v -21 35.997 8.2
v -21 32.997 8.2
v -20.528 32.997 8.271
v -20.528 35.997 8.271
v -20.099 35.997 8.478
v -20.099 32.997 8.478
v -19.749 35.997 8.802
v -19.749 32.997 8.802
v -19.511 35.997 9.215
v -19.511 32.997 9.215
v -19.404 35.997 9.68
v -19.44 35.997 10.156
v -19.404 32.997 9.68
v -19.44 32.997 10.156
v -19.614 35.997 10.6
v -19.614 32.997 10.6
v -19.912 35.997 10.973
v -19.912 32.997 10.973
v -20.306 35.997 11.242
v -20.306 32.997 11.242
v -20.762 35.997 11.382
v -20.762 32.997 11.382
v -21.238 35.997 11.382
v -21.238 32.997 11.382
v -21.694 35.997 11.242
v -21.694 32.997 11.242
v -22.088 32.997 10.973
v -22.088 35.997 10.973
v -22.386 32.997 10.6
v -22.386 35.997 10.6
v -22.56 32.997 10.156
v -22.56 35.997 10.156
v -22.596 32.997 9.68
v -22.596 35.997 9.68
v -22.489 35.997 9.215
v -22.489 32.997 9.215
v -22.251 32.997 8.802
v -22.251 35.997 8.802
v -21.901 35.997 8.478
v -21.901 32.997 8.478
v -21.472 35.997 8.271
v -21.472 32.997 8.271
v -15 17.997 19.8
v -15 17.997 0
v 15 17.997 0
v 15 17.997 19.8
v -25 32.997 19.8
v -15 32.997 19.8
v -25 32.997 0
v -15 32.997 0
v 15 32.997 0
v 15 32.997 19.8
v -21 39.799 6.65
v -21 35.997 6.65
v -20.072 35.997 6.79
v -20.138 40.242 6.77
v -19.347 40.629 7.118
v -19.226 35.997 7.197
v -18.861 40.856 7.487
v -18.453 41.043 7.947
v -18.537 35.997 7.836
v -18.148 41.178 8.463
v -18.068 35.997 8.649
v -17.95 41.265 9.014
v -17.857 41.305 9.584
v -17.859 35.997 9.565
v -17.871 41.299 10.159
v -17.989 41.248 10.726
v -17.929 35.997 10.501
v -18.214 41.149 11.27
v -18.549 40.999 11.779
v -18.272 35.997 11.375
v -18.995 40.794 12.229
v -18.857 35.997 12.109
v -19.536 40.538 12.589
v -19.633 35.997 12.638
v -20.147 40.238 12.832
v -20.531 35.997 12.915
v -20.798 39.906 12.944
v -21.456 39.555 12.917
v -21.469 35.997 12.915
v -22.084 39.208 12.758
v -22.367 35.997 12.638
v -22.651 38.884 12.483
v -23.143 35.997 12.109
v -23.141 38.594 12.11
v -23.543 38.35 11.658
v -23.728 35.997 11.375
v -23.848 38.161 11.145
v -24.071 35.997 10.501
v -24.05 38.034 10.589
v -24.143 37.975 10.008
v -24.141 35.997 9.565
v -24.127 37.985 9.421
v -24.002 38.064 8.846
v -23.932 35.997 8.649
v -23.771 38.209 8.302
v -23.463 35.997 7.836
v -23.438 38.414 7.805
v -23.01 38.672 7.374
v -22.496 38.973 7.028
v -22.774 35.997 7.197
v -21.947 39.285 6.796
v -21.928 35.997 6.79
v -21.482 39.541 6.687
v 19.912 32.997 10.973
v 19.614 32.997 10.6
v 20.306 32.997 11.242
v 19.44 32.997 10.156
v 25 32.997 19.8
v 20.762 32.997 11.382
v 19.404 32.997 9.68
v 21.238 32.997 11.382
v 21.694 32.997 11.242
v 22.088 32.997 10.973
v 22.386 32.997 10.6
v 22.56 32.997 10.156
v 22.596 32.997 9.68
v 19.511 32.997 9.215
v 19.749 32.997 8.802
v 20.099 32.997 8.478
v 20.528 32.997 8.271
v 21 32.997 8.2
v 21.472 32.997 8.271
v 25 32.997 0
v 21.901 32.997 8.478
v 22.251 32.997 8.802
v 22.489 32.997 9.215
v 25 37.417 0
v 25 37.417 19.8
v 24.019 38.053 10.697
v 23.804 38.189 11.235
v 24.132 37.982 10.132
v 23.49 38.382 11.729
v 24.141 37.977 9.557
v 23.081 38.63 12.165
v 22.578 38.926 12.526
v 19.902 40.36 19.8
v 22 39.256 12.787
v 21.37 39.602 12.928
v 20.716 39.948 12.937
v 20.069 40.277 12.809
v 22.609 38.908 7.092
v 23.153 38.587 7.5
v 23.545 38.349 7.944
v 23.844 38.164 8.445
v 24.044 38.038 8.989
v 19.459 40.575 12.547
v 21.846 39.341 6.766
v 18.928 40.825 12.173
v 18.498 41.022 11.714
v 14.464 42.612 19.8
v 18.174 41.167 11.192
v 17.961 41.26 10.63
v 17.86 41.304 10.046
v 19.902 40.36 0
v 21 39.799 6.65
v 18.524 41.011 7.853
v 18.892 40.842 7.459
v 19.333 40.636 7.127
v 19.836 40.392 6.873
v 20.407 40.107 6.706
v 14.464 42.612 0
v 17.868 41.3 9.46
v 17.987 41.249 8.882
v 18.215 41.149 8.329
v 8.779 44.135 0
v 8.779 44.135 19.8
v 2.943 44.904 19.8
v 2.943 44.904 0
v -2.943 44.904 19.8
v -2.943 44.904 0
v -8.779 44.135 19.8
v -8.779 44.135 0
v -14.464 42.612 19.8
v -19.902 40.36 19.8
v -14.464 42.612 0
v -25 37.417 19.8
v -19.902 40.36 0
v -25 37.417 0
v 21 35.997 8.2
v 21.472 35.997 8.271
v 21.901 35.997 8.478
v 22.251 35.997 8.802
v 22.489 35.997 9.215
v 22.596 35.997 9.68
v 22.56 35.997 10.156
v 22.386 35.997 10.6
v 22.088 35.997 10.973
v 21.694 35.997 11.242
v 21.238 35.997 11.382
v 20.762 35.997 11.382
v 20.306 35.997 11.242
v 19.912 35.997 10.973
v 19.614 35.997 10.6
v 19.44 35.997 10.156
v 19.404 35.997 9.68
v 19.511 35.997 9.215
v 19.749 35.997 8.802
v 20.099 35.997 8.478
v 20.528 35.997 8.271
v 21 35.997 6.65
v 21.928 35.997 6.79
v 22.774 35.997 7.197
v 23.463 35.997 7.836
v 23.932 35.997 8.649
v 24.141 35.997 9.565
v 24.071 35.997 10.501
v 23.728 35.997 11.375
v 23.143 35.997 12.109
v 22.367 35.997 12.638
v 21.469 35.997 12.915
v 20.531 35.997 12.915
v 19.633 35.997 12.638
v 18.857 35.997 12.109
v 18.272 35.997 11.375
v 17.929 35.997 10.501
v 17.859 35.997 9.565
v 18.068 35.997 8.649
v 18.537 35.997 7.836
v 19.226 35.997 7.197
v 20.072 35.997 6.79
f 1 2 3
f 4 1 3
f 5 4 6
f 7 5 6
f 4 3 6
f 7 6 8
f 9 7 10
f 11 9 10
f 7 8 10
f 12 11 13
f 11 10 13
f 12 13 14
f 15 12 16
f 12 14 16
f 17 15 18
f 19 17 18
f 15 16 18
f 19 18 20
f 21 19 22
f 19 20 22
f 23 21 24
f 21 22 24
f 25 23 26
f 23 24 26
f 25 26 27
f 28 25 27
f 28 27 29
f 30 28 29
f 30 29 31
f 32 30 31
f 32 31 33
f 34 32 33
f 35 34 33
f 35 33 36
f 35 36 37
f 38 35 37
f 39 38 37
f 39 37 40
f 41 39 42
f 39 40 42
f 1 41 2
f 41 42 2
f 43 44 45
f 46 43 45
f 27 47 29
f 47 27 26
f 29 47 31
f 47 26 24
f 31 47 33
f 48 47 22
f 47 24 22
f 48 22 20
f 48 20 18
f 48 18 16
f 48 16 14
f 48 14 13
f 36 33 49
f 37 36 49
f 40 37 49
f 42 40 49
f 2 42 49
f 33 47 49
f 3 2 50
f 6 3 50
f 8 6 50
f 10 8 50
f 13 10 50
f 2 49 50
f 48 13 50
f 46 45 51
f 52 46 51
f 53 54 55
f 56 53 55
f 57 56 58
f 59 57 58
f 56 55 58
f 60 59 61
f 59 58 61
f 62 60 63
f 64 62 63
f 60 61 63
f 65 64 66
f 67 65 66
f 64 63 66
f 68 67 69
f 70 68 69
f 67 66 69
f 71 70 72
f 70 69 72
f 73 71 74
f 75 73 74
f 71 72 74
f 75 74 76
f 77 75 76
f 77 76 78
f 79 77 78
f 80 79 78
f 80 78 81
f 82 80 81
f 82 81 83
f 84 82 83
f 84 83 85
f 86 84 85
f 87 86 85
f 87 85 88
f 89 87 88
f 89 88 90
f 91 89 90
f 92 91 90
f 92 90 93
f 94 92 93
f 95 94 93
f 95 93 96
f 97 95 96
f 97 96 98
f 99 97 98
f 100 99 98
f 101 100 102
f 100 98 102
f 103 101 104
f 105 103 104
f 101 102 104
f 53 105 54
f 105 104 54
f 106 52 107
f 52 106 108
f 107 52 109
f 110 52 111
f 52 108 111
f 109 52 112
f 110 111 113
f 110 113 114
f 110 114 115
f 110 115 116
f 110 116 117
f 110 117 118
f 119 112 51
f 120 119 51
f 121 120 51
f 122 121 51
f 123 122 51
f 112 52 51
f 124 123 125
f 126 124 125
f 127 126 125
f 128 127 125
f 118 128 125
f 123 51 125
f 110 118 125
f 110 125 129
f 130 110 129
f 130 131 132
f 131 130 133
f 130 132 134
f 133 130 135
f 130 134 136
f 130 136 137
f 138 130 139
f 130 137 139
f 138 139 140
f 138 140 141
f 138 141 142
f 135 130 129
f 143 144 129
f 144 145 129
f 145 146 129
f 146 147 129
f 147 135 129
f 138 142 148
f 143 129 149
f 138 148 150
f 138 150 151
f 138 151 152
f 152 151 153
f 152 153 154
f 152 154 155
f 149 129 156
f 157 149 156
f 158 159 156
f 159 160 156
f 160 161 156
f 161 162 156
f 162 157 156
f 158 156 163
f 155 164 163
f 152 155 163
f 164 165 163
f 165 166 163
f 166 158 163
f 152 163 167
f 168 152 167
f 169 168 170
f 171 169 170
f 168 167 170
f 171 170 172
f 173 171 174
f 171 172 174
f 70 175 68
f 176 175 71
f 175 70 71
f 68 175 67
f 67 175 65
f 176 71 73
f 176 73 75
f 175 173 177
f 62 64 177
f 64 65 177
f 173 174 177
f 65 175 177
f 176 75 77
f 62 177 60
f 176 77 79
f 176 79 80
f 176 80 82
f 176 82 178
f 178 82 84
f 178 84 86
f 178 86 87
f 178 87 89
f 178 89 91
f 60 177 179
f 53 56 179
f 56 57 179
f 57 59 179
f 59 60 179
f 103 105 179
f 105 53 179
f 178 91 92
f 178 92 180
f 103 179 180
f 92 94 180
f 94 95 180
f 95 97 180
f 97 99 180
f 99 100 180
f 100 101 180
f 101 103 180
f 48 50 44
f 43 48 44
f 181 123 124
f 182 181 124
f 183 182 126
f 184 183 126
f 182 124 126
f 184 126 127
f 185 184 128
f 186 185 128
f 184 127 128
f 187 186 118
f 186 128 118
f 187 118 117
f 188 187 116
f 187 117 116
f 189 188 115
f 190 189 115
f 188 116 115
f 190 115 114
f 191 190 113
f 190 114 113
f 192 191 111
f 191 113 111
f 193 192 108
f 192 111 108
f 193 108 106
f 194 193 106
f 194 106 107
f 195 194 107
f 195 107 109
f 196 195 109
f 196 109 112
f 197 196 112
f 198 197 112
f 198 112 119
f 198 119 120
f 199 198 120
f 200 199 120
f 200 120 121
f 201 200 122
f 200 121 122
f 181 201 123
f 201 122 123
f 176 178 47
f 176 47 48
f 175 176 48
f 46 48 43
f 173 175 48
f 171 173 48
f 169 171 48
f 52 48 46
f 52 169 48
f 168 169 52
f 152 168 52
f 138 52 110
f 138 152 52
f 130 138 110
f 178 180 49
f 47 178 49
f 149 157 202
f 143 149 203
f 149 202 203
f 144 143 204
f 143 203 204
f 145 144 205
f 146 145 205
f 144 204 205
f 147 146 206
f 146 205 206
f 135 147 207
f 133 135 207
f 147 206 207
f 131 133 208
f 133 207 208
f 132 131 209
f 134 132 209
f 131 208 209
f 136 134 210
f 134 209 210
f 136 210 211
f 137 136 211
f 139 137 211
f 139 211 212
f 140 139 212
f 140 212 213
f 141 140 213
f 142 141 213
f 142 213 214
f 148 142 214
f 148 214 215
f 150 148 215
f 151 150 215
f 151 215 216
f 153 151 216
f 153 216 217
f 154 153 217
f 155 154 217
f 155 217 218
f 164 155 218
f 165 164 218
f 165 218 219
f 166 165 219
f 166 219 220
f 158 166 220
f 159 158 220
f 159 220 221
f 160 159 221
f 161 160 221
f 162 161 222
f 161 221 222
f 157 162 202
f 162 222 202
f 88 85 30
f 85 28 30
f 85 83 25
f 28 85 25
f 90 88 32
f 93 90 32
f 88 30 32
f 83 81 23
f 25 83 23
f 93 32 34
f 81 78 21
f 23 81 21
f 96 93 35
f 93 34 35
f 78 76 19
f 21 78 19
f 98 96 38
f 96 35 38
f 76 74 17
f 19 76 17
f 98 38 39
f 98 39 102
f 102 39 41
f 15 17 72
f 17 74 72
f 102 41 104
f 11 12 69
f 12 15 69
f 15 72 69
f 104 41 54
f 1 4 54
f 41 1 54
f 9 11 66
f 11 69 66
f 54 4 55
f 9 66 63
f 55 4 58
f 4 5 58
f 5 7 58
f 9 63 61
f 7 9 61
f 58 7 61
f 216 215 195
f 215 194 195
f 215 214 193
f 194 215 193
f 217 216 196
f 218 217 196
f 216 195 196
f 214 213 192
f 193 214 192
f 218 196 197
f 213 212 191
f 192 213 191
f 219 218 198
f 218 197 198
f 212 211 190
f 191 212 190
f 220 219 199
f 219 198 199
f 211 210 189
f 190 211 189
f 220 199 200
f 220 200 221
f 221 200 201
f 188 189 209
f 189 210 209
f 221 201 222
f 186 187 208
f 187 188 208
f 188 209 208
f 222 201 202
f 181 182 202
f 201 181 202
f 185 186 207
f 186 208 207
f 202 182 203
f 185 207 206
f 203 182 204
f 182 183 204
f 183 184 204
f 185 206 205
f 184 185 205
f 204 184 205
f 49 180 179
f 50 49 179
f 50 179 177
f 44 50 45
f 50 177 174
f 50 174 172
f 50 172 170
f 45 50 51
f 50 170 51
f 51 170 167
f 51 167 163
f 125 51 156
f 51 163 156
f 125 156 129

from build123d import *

# Parameters (mm, degrees)
RESSALTO_EXTRUS_O1_DEPTH   = 19.8
ESBO_O3_R                  = 1.6
CORTE_EXTRUS_O1_DEPTH      = 3
CORTE_EXTRUS_O2_REACH      = 38.62
CORTE_EXTRUS_O2_END_RADIUS = 45
ESBO_O4_R                  = 3.15


with BuildPart() as part:
    # Esboço1 → Ressalto-extrusão1 (new body)
    with BuildSketch(Plane.XY):
        with BuildLine():
            Line((-25, 37.416573868), (-25, 32.996573868))
            Line((-25, 32.996573868), (-15, 32.996573868))
            Line((-15, 32.996573868), (-15, 17.996573868))
            Line((-15, 17.996573868), (15, 17.996573868))
            Line((15, 17.996573868), (15, 32.996573868))
            Line((15, 32.996573868), (25, 32.996573868))
            Line((25, 32.996573868), (25, 37.416573868))
            ThreePointArc((25, 37.416573868), (0, 45), (-25, 37.416573868))
        make_face()
    extrude(amount=RESSALTO_EXTRUS_O1_DEPTH)

    # Esboço3 → Corte-extrusão1 (cut)
    with BuildSketch(Plane.XZ.offset(-32.996573868)):
        with Locations(Location((21, 9.8, 0), (0, 0, 270))):
            Circle(ESBO_O3_R)
        with Locations(Location((-21, 9.8, 0), (0, 0, 270))):
            Circle(ESBO_O3_R)
    extrude(amount=-CORTE_EXTRUS_O1_DEPTH, mode=Mode.SUBTRACT)

    # Corte-extrusão2: up to this cylinder (the profile starts inside it)
    corte_extrus_o2_end = Plane(origin=(0, 0, 9.8), z_dir=(0, 0, -1)) * Cylinder(CORTE_EXTRUS_O2_END_RADIUS, 168.24, mode=Mode.PRIVATE)
    # Esboço4 → Corte-extrusão2 (cut, up to the surface)
    with BuildSketch(Plane.XZ.offset(-35.996573868), mode=Mode.PRIVATE) as corte_extrus_o2_sk1:
        with Locations(Location((21, 9.8, 0), (0, 0, 270))):
            Circle(ESBO_O4_R)
    corte_extrus_o2_tool1 = extrude(corte_extrus_o2_sk1.sketch, amount=-CORTE_EXTRUS_O2_REACH, mode=Mode.PRIVATE) & corte_extrus_o2_end
    add(corte_extrus_o2_tool1.solids().sort_by_distance((21, 35.996574, 9.8))[0], mode=Mode.SUBTRACT)
    # Esboço4 → Corte-extrusão2 (cut, up to the surface)
    with BuildSketch(Plane.XZ.offset(-35.996573868), mode=Mode.PRIVATE) as corte_extrus_o2_sk2:
        with Locations(Location((-21, 9.8, 0), (0, 0, 270))):
            Circle(ESBO_O4_R)
    corte_extrus_o2_tool2 = extrude(corte_extrus_o2_sk2.sketch, amount=-CORTE_EXTRUS_O2_REACH, mode=Mode.PRIVATE) & corte_extrus_o2_end
    add(corte_extrus_o2_tool2.solids().sort_by_distance((-21, 35.996574, 9.8))[0], mode=Mode.SUBTRACT)


solid = part.part
